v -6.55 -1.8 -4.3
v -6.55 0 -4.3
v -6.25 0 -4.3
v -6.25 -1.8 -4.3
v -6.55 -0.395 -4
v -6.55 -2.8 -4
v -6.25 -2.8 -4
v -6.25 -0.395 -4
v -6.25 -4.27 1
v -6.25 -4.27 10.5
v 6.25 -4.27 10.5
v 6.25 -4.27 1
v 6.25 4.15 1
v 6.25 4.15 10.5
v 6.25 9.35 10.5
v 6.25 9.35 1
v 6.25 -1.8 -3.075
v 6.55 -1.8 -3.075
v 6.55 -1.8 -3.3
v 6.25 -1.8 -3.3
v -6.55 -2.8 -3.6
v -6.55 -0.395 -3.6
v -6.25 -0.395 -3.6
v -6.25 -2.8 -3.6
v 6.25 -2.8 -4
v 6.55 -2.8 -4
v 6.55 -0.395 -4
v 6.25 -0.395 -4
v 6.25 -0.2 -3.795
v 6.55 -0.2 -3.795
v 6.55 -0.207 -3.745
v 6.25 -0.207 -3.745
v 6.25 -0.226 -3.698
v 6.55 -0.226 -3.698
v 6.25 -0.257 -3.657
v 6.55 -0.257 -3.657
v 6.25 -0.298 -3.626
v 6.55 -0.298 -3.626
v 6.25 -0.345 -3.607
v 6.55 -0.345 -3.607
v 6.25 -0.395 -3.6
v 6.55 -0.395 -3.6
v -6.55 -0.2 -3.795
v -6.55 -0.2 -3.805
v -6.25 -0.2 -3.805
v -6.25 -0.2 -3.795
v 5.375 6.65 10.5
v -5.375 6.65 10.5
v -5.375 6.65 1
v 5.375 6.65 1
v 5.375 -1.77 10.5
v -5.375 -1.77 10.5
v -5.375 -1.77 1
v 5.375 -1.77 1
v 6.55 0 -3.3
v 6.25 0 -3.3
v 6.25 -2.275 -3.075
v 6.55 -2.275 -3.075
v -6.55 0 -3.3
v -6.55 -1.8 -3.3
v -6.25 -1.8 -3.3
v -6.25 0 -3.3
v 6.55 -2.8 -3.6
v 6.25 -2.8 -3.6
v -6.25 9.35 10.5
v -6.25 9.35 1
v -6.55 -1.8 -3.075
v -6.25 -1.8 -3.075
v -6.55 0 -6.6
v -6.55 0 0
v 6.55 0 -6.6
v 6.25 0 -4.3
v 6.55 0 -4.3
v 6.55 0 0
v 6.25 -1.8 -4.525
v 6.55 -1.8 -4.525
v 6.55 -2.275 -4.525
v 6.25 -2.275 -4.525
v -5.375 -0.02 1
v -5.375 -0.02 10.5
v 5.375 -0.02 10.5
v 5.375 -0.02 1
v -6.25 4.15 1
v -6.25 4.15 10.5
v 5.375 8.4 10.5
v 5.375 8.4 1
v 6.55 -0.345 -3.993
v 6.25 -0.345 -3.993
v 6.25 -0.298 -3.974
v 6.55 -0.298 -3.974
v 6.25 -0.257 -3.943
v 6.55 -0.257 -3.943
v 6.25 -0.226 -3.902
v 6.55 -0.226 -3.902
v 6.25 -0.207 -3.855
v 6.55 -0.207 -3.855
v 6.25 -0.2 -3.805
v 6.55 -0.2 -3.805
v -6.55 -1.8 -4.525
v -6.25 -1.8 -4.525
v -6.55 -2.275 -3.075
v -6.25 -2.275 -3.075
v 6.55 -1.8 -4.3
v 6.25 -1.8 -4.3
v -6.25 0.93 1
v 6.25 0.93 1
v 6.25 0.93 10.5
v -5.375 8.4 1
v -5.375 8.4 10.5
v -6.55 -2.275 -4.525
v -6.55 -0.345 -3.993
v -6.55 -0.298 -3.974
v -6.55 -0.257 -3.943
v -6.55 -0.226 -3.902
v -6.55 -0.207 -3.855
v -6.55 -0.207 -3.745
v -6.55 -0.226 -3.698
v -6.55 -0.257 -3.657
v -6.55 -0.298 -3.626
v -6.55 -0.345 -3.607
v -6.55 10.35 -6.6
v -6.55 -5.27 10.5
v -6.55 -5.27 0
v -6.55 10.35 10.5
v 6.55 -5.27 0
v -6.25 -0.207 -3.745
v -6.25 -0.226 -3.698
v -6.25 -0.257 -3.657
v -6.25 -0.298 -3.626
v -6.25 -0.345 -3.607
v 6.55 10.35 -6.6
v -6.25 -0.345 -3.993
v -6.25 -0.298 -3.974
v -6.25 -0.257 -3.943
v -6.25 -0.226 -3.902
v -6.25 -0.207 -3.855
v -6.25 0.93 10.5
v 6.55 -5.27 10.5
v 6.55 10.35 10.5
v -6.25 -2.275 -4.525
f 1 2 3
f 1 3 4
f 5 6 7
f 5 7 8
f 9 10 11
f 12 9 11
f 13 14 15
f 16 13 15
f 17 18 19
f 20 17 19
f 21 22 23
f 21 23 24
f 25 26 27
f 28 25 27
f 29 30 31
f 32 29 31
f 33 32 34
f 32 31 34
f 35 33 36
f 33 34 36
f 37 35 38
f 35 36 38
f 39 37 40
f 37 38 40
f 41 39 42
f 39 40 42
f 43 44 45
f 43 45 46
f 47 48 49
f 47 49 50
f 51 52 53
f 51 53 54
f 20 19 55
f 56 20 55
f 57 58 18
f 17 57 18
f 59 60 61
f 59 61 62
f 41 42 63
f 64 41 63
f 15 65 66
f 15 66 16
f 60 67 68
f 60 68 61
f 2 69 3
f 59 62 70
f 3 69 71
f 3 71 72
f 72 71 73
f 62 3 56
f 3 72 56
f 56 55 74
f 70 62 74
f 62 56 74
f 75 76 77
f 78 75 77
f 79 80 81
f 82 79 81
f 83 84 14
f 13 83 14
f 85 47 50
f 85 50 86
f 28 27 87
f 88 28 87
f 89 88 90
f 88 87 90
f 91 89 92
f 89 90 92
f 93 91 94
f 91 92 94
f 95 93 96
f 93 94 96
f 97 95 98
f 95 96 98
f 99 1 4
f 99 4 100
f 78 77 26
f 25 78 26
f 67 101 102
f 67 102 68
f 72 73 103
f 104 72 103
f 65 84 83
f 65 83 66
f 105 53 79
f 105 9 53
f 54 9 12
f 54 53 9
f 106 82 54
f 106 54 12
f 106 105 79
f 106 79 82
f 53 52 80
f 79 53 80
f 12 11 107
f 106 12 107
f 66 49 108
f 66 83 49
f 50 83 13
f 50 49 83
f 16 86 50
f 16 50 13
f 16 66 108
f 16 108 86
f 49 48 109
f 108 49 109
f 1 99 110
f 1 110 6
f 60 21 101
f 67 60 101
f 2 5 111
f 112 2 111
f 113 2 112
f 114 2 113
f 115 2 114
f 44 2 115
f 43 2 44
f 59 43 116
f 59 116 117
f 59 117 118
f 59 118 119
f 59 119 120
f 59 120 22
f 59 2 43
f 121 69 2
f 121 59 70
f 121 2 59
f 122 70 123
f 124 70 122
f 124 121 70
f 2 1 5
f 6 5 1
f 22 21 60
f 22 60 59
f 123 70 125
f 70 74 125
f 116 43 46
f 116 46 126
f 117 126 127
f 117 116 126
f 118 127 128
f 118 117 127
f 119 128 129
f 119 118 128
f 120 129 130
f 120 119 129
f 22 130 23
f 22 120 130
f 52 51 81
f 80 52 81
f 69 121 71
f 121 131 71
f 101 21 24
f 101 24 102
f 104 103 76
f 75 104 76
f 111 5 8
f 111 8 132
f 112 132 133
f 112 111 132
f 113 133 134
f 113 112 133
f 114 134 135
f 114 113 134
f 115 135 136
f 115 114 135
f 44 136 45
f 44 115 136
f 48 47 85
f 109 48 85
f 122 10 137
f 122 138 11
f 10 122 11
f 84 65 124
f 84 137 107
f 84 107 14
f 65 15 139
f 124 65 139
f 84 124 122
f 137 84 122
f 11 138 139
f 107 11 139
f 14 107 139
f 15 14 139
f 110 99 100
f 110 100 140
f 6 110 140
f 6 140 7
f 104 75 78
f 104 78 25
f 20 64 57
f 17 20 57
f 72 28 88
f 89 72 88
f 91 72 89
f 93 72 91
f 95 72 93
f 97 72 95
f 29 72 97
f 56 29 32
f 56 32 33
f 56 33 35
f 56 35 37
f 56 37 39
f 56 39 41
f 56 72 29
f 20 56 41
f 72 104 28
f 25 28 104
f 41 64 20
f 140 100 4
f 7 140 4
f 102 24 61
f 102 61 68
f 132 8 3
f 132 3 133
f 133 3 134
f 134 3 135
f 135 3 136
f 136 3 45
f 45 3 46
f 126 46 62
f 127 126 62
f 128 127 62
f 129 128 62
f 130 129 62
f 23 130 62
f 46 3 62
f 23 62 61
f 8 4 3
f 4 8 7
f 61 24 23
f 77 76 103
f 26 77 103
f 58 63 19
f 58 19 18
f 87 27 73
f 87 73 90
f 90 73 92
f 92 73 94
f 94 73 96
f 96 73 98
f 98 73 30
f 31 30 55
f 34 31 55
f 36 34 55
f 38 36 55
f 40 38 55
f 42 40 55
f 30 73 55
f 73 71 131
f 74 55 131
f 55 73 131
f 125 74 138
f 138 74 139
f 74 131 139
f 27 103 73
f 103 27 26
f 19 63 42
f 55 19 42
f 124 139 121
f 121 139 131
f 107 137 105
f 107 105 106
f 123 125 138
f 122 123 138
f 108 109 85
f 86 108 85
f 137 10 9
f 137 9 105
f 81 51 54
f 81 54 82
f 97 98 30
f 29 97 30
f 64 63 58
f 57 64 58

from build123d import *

# Parameters (mm, degrees)
BOSS_EXTRUDE1_DEPTH      = 6.55
BOSS_EXTRUDE1_DEPTH_BACK = 6.55
SKETCH2_W                = 12.5
SKETCH2_H                = 5.2
SKETCH2_W_2              = 10.75
SKETCH2_H_2              = 1.75
CUT_EXTRUDE1_DEPTH       = 9.5
BOSS_EXTRUDE2_DEPTH      = 0.3


with BuildPart() as part:
    # Sketch1 → Boss-Extrude1 (new body, two sides)
    with BuildSketch(Plane(origin=(0, 0, 0), x_dir=(0, 0, -1), z_dir=(1, 0, 0))) as boss_extrude1_sk:
        Polygon((-10.5, 10.35), (6.6, 10.35), (6.6, 0), (0, 0), (0, -5.27), (-10.5, -5.27), align=None)
    extrude(amount=BOSS_EXTRUDE1_DEPTH)
    extrude(boss_extrude1_sk.sketch, amount=-BOSS_EXTRUDE1_DEPTH_BACK)

    # Sketch2 → Cut-Extrude1 (cut)
    with BuildSketch(Plane.XY.offset(10.5)):
        with Locations((0, 6.75)):
            Rectangle(SKETCH2_W, SKETCH2_H)
        with Locations((0, 7.525)):
            Rectangle(SKETCH2_W_2, SKETCH2_H_2, mode=Mode.SUBTRACT)
        with Locations((0, -1.67)):
            Rectangle(SKETCH2_W, SKETCH2_H)
        with Locations((0, -0.895)):
            Rectangle(SKETCH2_W_2, SKETCH2_H_2, mode=Mode.SUBTRACT)
    extrude(amount=-CUT_EXTRUDE1_DEPTH, mode=Mode.SUBTRACT)

    # Sketch3 → Boss-Extrude2 (add)
    with BuildSketch(Plane(origin=(6.55, 0, 0), x_dir=(0, 0, -1), z_dir=(1, 0, 0))):
        with BuildLine():
            Line((3.6, -2.8), (3.075, -2.275))
            Line((3.075, -2.275), (3.075, -1.8))
            Line((3.075, -1.8), (3.3, -1.8))
            Line((3.3, -1.8), (3.3, 0))
            Line((3.3, 0), (4.3, 0))
            Line((4.3, 0), (4.3, -1.8))
            Line((4.3, -1.8), (4.525, -1.8))
            Line((4.525, -1.8), (4.525, -2.275))
            Line((4.525, -2.275), (4, -2.8))
            Line((4, -2.8), (4, -0.395))
            ThreePointArc((4, -0.395), (3.942885822, -0.257114178), (3.805, -0.2))
            Line((3.805, -0.2), (3.795, -0.2))
            ThreePointArc((3.795, -0.2), (3.657114178, -0.257114178), (3.6, -0.395))
            Line((3.6, -0.395), (3.6, -2.8))
        make_face()
    boss_extrude2 = extrude(amount=-BOSS_EXTRUDE2_DEPTH)

    # Mirror1: Boss-Extrude2 across plane
    add(boss_extrude2.mirror(Plane(origin=(0, 0, 0), x_dir=(0, 0, 1), z_dir=(1, 0, 0))))


solid = part.part
